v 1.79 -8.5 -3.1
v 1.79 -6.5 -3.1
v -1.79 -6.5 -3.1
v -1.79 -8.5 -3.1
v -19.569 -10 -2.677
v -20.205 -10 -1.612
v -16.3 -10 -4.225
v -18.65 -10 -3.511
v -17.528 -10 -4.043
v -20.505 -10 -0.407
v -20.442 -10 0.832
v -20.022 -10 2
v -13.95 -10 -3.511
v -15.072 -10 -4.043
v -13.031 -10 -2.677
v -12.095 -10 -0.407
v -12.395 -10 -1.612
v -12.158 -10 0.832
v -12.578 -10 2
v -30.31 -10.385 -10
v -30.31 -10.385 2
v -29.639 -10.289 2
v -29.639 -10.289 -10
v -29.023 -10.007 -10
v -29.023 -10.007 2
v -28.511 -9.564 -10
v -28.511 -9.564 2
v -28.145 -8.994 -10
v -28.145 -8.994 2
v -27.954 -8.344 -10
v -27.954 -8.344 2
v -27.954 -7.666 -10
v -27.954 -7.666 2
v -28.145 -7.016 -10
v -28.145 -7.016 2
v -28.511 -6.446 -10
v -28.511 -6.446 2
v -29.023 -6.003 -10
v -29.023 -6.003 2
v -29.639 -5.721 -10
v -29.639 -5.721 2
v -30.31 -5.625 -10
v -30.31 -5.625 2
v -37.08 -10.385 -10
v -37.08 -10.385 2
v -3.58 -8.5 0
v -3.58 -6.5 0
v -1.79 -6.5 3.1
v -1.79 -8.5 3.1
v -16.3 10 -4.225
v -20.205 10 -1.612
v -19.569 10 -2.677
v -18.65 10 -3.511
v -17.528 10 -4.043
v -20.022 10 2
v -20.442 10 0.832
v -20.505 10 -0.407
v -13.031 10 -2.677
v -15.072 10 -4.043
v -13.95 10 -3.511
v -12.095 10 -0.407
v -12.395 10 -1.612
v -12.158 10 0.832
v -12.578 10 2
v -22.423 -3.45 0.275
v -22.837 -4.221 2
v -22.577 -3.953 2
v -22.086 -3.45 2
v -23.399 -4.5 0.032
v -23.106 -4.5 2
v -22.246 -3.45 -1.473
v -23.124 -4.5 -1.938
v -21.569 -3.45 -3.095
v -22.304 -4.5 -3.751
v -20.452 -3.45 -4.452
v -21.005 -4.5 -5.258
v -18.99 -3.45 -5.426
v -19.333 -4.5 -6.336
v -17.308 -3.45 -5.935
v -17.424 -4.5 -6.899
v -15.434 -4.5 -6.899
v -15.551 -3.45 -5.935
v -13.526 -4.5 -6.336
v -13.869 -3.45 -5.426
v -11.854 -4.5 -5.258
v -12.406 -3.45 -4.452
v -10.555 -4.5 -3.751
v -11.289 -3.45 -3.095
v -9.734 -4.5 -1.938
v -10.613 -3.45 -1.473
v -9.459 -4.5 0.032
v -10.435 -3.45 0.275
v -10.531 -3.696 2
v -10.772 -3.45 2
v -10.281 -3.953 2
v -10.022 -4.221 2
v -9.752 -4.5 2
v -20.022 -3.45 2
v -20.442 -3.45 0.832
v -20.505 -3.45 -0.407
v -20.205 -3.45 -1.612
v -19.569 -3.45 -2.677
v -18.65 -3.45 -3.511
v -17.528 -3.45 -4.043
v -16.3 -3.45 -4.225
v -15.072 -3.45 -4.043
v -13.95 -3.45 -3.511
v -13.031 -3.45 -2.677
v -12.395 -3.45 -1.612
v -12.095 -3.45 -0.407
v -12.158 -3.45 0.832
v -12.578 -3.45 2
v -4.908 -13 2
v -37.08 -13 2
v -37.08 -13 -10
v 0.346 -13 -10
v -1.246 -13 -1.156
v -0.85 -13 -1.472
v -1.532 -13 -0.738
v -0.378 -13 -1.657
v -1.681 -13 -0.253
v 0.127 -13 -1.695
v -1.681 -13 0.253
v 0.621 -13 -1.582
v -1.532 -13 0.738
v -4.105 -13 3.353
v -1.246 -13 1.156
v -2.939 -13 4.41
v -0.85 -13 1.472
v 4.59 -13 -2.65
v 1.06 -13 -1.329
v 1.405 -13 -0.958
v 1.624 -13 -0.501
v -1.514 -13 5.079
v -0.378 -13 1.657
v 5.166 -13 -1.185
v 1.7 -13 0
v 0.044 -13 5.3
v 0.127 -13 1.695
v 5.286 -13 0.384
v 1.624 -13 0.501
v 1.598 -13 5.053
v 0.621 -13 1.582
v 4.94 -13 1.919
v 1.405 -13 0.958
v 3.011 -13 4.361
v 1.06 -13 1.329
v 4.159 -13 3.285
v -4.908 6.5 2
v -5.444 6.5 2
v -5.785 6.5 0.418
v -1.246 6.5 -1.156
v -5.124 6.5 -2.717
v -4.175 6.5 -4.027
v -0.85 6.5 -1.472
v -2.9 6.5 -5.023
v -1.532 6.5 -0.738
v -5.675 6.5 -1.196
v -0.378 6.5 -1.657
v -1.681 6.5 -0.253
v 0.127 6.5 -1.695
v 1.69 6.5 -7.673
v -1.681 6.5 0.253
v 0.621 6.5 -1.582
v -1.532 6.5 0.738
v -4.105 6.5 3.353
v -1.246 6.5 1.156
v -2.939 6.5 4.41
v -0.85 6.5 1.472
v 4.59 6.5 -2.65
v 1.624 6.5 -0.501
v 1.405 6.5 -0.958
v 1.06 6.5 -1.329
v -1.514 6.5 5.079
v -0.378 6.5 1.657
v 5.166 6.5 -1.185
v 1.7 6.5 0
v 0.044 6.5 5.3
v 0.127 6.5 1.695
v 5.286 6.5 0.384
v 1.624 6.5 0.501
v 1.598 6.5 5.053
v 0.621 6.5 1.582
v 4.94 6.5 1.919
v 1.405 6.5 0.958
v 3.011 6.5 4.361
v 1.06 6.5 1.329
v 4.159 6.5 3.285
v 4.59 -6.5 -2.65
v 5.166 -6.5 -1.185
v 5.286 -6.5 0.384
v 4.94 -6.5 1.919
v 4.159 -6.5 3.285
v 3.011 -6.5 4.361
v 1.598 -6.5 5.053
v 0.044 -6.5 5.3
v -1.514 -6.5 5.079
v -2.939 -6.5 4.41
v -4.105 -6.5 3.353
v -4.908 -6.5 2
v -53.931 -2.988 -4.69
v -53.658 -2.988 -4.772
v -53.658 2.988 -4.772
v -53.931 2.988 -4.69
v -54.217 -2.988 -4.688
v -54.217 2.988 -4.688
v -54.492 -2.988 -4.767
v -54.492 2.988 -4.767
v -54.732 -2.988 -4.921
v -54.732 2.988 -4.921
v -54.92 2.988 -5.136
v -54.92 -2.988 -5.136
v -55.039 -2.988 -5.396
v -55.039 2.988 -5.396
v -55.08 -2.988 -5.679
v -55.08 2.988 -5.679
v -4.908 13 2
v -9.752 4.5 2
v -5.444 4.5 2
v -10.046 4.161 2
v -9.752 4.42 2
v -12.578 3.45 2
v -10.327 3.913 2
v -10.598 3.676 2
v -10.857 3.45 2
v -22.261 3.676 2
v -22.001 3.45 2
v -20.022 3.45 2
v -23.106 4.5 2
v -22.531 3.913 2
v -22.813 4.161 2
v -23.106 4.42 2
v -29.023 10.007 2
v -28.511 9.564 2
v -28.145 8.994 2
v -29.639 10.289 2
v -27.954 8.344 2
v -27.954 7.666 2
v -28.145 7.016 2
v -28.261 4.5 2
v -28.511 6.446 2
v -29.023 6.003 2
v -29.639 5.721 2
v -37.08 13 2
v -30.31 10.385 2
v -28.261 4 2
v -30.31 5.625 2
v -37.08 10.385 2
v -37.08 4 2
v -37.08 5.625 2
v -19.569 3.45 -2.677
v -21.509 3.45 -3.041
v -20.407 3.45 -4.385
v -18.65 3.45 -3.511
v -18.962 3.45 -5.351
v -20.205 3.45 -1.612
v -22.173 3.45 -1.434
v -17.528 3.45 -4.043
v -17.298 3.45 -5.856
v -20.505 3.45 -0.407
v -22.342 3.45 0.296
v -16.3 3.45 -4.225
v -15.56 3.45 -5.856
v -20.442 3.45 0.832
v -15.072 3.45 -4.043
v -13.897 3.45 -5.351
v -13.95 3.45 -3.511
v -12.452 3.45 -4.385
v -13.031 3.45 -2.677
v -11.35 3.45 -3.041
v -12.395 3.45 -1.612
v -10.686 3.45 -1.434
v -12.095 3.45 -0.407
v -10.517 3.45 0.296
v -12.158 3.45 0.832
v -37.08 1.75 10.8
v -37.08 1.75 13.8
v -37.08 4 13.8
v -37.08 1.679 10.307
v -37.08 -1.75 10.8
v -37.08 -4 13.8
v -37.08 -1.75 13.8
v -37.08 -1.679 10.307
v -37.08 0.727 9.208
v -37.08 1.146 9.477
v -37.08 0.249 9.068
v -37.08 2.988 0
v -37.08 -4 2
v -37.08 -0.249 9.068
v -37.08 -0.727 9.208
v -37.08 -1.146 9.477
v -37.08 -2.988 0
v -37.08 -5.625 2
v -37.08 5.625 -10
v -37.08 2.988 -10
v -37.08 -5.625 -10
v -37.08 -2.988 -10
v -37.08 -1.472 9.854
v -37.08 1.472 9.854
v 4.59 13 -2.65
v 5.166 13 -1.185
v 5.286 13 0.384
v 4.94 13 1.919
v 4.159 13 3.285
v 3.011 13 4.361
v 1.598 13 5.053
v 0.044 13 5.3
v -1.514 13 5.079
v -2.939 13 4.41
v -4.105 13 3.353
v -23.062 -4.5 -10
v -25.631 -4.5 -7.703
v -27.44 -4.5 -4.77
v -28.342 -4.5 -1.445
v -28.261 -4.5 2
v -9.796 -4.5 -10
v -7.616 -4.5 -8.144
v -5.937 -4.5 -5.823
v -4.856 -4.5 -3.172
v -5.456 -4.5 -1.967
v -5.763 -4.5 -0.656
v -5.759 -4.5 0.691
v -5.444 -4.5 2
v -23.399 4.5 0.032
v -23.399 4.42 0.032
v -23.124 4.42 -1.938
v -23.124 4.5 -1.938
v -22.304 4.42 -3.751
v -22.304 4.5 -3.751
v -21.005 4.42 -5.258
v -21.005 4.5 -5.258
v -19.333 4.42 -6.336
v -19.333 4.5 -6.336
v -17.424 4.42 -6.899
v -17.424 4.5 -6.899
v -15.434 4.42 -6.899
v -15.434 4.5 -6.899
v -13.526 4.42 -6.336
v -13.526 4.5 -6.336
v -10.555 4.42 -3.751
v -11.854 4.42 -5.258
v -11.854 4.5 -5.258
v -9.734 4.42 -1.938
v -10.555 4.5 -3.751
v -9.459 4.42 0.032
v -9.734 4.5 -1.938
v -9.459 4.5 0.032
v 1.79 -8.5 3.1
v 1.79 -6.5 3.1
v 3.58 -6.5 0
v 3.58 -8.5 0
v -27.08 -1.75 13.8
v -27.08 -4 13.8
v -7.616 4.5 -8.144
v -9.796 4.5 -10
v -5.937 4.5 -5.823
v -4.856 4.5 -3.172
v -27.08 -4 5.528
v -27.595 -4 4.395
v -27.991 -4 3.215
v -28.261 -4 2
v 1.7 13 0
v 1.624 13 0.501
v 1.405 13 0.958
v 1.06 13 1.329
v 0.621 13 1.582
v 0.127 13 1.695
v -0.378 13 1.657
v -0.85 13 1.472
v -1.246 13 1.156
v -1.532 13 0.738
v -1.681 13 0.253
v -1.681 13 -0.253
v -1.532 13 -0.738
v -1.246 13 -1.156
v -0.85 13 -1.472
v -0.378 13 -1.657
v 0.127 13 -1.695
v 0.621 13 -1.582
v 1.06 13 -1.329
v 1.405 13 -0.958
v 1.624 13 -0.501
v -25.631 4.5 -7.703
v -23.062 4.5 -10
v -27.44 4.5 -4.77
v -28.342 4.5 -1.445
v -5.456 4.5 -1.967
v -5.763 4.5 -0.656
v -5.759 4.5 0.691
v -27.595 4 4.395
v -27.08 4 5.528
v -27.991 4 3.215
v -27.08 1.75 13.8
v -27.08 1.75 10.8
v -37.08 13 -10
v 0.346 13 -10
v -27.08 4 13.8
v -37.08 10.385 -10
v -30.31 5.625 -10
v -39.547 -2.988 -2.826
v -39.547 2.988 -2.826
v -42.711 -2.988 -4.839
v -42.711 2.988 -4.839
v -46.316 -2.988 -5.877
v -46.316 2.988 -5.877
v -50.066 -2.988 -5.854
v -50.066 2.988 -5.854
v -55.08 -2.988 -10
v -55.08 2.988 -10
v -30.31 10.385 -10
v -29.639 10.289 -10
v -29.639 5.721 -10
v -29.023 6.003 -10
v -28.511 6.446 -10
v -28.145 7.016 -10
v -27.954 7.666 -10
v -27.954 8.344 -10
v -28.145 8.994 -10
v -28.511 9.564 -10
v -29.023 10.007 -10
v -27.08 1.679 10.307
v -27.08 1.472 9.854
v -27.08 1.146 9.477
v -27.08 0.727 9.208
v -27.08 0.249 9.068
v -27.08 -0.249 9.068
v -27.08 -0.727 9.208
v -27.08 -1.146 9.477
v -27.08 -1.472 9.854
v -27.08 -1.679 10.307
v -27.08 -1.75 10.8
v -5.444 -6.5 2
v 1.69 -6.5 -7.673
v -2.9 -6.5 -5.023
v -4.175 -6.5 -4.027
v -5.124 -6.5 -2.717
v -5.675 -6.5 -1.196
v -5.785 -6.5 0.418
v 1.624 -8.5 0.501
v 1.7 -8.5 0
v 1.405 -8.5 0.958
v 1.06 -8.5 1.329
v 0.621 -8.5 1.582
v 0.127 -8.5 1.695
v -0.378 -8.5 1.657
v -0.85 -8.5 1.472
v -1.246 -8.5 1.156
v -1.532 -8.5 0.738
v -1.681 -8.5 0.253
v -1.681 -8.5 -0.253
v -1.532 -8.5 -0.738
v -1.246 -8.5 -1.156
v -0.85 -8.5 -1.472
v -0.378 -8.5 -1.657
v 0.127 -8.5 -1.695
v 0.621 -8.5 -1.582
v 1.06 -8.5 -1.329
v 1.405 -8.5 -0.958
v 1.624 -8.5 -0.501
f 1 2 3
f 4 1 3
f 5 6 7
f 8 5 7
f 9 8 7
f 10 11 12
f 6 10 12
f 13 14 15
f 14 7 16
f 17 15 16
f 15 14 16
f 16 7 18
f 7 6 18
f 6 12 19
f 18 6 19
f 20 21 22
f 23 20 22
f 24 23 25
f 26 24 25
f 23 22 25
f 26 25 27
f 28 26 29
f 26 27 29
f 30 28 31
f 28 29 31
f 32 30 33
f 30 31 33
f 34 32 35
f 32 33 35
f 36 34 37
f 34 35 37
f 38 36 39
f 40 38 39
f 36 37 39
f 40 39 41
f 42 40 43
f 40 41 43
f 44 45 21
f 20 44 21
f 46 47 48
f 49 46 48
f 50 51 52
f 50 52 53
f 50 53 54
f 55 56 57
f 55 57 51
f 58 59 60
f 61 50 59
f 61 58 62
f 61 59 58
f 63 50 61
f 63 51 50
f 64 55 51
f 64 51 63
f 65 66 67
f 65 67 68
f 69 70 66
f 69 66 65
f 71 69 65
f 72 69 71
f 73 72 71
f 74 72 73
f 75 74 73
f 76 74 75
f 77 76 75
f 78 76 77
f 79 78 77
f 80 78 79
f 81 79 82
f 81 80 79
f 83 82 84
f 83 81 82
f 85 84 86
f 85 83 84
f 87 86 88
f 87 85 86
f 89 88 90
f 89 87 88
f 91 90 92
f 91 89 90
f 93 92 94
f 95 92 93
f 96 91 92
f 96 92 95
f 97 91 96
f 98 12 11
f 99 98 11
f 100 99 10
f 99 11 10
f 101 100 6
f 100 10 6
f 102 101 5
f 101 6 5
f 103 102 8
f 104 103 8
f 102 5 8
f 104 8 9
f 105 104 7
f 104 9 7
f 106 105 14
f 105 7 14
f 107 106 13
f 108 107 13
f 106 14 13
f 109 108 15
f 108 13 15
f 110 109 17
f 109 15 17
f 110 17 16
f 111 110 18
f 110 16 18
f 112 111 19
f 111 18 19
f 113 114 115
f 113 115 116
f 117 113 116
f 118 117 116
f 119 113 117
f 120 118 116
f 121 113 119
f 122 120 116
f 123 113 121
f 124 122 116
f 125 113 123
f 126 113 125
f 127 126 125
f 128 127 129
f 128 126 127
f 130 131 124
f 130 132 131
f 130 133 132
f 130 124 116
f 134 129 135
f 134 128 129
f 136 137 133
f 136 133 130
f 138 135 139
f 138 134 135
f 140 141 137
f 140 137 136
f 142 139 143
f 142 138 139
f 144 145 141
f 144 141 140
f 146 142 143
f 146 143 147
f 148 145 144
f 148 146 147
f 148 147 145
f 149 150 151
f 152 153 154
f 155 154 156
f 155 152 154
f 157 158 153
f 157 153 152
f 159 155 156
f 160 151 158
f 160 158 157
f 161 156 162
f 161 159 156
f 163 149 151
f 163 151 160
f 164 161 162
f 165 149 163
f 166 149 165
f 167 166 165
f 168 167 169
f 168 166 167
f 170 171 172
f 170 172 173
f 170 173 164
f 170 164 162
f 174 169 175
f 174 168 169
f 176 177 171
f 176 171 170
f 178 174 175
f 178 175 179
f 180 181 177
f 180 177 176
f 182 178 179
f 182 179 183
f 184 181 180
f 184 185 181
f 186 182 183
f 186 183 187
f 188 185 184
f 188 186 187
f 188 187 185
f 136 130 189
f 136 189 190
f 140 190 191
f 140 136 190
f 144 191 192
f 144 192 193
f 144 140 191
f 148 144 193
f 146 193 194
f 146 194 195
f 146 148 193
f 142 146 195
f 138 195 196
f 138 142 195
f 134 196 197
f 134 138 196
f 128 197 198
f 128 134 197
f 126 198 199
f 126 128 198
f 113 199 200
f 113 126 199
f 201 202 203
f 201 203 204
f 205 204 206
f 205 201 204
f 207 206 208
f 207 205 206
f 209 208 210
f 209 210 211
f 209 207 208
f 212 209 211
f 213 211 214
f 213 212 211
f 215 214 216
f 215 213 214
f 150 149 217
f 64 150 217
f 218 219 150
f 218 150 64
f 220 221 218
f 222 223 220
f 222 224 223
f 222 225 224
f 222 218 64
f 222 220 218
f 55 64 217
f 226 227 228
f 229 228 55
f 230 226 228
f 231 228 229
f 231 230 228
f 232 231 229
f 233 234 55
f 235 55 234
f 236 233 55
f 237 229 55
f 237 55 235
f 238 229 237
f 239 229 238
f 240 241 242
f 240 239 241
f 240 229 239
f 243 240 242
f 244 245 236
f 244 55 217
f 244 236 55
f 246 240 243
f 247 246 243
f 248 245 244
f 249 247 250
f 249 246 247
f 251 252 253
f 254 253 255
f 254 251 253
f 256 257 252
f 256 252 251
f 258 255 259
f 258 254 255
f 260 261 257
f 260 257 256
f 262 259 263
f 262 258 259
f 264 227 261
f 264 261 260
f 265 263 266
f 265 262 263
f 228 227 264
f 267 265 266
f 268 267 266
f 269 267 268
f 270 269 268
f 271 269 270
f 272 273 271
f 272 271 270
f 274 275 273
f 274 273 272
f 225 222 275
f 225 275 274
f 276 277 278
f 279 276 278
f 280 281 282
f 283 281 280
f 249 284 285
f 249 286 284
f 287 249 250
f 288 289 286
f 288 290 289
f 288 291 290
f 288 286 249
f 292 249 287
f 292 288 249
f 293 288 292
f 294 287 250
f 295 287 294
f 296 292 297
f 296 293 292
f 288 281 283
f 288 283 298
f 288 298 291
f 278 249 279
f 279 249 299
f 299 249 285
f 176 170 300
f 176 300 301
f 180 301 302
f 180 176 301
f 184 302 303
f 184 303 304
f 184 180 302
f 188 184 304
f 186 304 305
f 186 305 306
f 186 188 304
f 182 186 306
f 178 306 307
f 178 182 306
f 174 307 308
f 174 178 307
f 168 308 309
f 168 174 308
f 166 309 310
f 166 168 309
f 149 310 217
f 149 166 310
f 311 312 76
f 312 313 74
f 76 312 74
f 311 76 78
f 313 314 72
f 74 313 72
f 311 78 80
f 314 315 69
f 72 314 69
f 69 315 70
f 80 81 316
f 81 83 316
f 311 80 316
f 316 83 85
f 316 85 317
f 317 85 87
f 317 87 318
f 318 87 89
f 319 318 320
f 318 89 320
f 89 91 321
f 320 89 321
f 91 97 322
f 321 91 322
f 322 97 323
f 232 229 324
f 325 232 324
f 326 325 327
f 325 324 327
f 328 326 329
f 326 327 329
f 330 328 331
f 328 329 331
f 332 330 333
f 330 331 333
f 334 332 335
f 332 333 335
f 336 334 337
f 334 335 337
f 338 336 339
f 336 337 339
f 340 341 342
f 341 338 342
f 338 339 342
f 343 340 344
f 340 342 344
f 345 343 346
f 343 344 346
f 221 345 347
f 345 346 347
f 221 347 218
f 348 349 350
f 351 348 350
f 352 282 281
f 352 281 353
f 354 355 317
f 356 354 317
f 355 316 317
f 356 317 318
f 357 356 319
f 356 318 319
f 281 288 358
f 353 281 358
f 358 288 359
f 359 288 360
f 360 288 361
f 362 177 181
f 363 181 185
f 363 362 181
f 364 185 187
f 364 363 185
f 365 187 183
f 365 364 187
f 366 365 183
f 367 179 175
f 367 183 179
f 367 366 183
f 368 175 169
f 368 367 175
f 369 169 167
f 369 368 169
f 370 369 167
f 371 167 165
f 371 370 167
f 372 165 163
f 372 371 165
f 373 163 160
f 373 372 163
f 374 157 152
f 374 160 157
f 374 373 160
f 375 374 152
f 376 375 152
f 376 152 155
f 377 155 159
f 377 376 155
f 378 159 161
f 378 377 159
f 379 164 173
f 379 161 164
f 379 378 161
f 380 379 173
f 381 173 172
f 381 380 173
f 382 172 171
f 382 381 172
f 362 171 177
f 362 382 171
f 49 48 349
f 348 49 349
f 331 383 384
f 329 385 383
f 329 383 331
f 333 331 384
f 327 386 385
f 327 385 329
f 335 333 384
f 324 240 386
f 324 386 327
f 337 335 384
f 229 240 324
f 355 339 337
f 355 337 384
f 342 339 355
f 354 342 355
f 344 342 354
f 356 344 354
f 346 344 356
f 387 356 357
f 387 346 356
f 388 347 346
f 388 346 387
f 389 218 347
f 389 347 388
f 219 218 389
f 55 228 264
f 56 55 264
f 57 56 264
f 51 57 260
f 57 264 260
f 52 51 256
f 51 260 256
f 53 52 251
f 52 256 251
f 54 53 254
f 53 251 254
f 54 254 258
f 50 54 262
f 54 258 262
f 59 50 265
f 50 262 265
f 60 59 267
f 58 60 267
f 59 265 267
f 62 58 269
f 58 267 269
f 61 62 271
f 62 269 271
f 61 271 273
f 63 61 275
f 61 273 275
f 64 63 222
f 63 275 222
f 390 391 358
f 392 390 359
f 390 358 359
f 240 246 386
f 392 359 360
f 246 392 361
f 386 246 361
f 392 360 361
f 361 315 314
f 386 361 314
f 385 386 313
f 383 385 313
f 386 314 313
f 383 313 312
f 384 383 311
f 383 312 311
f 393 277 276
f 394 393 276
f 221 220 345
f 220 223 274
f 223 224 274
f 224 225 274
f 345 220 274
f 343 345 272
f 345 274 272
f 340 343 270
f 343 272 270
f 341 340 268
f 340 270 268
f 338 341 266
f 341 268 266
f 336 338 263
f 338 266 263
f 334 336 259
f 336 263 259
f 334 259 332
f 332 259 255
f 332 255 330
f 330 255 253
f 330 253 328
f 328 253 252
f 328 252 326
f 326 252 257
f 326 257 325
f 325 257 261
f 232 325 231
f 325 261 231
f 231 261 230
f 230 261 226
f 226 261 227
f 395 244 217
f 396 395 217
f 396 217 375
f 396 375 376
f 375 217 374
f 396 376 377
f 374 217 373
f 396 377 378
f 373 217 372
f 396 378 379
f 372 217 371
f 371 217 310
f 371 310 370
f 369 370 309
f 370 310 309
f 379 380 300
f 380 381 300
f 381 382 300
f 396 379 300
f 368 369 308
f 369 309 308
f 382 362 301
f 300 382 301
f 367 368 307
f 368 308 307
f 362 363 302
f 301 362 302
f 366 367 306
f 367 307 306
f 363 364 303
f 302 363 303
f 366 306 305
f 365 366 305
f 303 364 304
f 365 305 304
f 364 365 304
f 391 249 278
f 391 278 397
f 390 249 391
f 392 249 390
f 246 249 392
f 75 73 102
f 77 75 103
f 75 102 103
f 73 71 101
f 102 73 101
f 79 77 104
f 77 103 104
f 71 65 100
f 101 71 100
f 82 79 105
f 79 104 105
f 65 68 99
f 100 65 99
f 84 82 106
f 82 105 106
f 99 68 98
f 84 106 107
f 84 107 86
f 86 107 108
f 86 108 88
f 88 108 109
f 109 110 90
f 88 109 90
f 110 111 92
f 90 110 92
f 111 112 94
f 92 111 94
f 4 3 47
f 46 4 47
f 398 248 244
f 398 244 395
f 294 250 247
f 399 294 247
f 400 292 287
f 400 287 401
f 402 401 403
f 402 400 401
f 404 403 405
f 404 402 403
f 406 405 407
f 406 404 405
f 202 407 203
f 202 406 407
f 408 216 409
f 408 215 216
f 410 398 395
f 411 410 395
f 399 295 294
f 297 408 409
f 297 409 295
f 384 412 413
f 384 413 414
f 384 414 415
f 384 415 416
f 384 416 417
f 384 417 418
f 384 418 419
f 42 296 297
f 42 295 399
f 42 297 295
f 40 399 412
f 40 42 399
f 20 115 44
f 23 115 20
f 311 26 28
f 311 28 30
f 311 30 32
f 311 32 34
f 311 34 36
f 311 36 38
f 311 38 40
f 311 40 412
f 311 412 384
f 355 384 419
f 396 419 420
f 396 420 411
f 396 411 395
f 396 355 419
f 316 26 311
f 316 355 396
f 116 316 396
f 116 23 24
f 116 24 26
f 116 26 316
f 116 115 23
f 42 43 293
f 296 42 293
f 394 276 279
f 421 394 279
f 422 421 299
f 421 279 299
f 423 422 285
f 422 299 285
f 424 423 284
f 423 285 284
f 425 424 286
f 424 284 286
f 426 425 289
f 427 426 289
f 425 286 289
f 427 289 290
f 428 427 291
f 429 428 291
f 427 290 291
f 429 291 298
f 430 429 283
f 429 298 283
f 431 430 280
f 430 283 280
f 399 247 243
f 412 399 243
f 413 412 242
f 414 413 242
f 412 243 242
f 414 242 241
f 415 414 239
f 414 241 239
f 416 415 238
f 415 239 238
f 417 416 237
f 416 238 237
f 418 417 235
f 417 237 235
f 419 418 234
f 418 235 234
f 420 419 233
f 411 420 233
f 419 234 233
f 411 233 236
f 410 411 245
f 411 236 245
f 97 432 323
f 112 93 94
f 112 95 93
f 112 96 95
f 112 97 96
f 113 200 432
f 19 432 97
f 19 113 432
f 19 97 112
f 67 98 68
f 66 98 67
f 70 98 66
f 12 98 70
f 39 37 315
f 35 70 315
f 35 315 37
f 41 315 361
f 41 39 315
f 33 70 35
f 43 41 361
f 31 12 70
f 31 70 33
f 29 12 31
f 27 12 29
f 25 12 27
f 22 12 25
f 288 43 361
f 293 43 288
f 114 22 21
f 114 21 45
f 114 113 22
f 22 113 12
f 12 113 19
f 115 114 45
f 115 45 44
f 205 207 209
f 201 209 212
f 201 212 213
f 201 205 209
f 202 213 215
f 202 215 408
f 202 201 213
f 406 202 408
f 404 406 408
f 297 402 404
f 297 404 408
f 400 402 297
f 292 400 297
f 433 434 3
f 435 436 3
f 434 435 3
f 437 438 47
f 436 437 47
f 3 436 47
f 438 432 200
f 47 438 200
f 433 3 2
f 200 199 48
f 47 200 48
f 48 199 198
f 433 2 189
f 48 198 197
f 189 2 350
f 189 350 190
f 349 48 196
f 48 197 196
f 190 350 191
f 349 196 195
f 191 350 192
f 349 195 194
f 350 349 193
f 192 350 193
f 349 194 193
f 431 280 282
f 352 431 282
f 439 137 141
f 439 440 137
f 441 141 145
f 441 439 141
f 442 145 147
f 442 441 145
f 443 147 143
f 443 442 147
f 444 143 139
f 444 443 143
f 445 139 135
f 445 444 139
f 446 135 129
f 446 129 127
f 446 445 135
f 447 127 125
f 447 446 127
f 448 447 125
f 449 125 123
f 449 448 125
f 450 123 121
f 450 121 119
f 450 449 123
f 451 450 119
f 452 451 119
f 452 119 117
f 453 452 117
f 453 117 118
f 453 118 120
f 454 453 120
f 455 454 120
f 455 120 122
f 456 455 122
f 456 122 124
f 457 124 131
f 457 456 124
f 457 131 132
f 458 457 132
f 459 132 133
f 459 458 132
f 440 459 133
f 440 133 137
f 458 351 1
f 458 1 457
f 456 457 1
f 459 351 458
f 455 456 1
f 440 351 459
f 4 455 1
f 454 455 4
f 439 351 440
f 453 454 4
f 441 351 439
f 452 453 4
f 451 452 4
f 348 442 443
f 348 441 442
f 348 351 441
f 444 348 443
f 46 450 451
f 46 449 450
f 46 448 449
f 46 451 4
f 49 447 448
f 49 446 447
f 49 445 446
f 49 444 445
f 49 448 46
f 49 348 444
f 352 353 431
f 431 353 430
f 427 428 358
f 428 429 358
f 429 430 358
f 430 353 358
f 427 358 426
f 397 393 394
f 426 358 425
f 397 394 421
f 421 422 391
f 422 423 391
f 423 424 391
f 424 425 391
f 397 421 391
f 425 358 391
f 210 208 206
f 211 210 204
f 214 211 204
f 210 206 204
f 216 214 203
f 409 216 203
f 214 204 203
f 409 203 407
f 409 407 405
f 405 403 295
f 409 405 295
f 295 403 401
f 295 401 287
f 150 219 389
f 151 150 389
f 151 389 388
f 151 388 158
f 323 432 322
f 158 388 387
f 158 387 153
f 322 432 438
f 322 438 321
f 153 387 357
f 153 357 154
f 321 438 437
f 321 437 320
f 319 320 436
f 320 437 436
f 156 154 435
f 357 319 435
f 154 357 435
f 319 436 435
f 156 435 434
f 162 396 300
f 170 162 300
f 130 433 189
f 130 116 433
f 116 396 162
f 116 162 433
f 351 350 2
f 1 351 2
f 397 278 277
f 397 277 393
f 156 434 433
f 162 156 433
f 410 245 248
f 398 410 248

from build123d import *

# Parameters (mm, degrees)
F0_R         = 1.7
F1_DEPTH     = 13
F3_DEPTH     = 12.001
F5_DEPTH     = 6.5
F6_W         = 10
F6_H         = 8
F7_DEPTH     = 11.8
F9_DEPTH     = 42.381
F10_R        = 4.225
F11_DEPTH    = 10
F12_R        = 7.5
F13_DEPTH    = 3.45
F16_R        = 12
F16_R_2      = 6.97
F17_DEPTH    = 4.5
F18_T4_ANGLE = 257.8909092885
F18_T7_ANGLE = 257.8909092885
F20_DEPTH    = 2.9885
F22_DEPTH    = 2


# Not quite as in the source:
# - a fillet or chamfer that OpenCascade refuses, or shapes differently, is made with other operations: its cross-section is extruded or revolved along the edge and cut away or added


with BuildPart() as f1:
    # F0 (on Front) → F1 (new body, symmetric)
    with BuildSketch(Plane.XZ):
        with BuildLine():
            Line((-37.08, 2), (-37.08, -10))
            Line((-37.08, -10), (0.3464101615, -10))
            Line((0.3464101615, -10), (4.5899346401, -2.65))
            ThreePointArc((4.5899346401, -2.65), (2.3304380027, 4.760153224), (-4.9081564767, 2))
            Line((-4.9081564767, 2), (-37.08, 2))
        make_face()
        Circle(F0_R, mode=Mode.SUBTRACT)
    extrude(amount=F1_DEPTH, both=True)

    # F2 (on face) → F3 (cut, through all)
    with BuildSketch(Plane.XY.offset(2)):
        with BuildLine():
            Line((-30.31, 10.385), (-37.08, 10.385))
            Line((-37.08, 10.385), (-37.08, 5.625))
            Line((-37.08, 5.625), (-30.31, 5.625))
            ThreePointArc((-30.31, 5.625), (-27.93, 8.005), (-30.31, 10.385))
        make_face()
        with BuildLine():
            ThreePointArc((-30.31, -10.385), (-27.93, -8.005), (-30.31, -5.625))
            Line((-30.31, -5.625), (-37.08, -5.625))
            Line((-37.08, -5.625), (-37.08, -10.385))
            Line((-37.08, -10.385), (-30.31, -10.385))
        make_face()
    extrude(amount=-F3_DEPTH, mode=Mode.SUBTRACT)

    # F4 (on Front) → F5 (cut, symmetric)
    with BuildSketch(Plane.XZ):
        with BuildLine():
            Line((5.8, -10.0458946839), (5.8, 0))
            ThreePointArc((5.8, 0), (-2.9, 5.0229473419), (-2.9, -5.0229473419))
            Line((-2.9, -5.0229473419), (5.8, -10.0458946839))
        make_face()
    extrude(amount=F5_DEPTH, both=True, mode=Mode.SUBTRACT)

    # F6 (on face) → F7 (join)
    with BuildSketch(Plane.XY.offset(2)):
        with Locations((-32.08, 0)):
            Rectangle(F6_W, F6_H)
    extrude(amount=F7_DEPTH)

    # F8 (on face) → F9 (cut, through all)
    with BuildSketch(Plane(origin=(-37.08, 0, 0), x_dir=(0, -1, 0), z_dir=(-1, 0, 0))):
        with BuildLine():
            Line((1.75, 13.8), (-1.75, 13.8))
            Line((-1.75, 13.8), (-1.75, 10.8))
            ThreePointArc((-1.75, 10.8), (0, 9.05), (1.75, 10.8))
            Line((1.75, 10.8), (1.75, 13.8))
        make_face()
    extrude(amount=-F9_DEPTH, mode=Mode.SUBTRACT)

    # F10 (on Front) → F11 (cut, symmetric)
    with BuildSketch(Plane.XZ):
        with Locations((-16.3, 0)):
            Circle(F10_R)
    extrude(amount=F11_DEPTH, both=True, mode=Mode.SUBTRACT)

    # F12 (on Front) → F13 (cut, symmetric)
    with BuildSketch(Plane.XZ):
        with Locations((-16.3, 0)):
            Circle(F12_R)
    extrude(amount=F13_DEPTH, both=True, mode=Mode.SUBTRACT)

    # F16 (on Front) → F17 (cut, symmetric)
    with BuildSketch(Plane.XZ):
        with Locations((-16.4292231202, 0)):
            Circle(F16_R)
        with Locations((-16.4292231202, 0)):
            Circle(F16_R_2, mode=Mode.SUBTRACT)
    extrude(amount=F17_DEPTH, both=True, mode=Mode.SUBTRACT)

    # F18: chamfer of 1.05 x 0.9699305265 on 2 edges, made by hand


with BuildPart() as f18_tool2:
    # F18_s3 → F18_t4 (revolve)
    with BuildSketch(Plane(origin=(-6.4914021144, 0, -8.0318361717), x_dir=(0, 1, 0), z_dir=(0.6285802661, 0, 0.7777447197))):
        Polygon((-3.45, 18.7778110045), (-4.5, 19.747741531), (-3.45, 19.747741531), align=None)
    revolve(axis=Axis((-16.4292231202, -3.45, 0), (0, -1, 0)), revolution_arc=F18_T4_ANGLE)

    split(bisect_by=Plane.XZ.offset(4.5), keep=Keep.BOTTOM)


with BuildPart() as f1_1:
    add(f1.part)

    # F18_t1: cut F18_tool2
    add(f18_tool2.part, mode=Mode.SUBTRACT)

    # F18_s6 → F18_t7 (revolve, cut)
    with BuildSketch(Plane(origin=(-6.4914021144, 0, 8.0318361717), x_dir=(0, 1, 0), z_dir=(-0.6285802661, 0, 0.7777447197))):
        Polygon((4.4199305265, 5.807741531), (3.45, 6.857741531), (3.45, 5.807741531), align=None)
    revolve(axis=Axis((-16.4292231202, 3.45, 0), (0, 1, 0)), revolution_arc=F18_T7_ANGLE, mode=Mode.SUBTRACT)

    # F19 (on Front) → F20 (join, symmetric)
    with BuildSketch(Plane.XZ):
        with BuildLine():
            Line((-37.08, -10), (-37.08, 0))
            ThreePointArc((-37.08, 0), (-44.4762536163, -5.4872309342), (-53.6579068221, -4.7720279633))
            ThreePointArc((-53.6579068221, -4.7720279633), (-54.617543869, -4.8353446309), (-55.08, -5.6785804158))
            Line((-55.08, -5.6785804158), (-55.08, -10))
            Line((-55.08, -10), (-37.08, -10))
        make_face()
    extrude(amount=F20_DEPTH, both=True)

    # F21 (on face) → F22 (cut)
    with BuildSketch(Plane(origin=(0, -6.5, 0), x_dir=(-1, 0, 0), z_dir=(0, 1, 0))):
        Polygon((-3.579571669, 0), (-1.7897858345, -3.1), (1.7897858345, -3.1), (3.579571669, 0), (1.7897858345, 3.1), (-1.7897858345, 3.1), align=None)
    extrude(amount=-F22_DEPTH, mode=Mode.SUBTRACT)


solid = f1_1.part
